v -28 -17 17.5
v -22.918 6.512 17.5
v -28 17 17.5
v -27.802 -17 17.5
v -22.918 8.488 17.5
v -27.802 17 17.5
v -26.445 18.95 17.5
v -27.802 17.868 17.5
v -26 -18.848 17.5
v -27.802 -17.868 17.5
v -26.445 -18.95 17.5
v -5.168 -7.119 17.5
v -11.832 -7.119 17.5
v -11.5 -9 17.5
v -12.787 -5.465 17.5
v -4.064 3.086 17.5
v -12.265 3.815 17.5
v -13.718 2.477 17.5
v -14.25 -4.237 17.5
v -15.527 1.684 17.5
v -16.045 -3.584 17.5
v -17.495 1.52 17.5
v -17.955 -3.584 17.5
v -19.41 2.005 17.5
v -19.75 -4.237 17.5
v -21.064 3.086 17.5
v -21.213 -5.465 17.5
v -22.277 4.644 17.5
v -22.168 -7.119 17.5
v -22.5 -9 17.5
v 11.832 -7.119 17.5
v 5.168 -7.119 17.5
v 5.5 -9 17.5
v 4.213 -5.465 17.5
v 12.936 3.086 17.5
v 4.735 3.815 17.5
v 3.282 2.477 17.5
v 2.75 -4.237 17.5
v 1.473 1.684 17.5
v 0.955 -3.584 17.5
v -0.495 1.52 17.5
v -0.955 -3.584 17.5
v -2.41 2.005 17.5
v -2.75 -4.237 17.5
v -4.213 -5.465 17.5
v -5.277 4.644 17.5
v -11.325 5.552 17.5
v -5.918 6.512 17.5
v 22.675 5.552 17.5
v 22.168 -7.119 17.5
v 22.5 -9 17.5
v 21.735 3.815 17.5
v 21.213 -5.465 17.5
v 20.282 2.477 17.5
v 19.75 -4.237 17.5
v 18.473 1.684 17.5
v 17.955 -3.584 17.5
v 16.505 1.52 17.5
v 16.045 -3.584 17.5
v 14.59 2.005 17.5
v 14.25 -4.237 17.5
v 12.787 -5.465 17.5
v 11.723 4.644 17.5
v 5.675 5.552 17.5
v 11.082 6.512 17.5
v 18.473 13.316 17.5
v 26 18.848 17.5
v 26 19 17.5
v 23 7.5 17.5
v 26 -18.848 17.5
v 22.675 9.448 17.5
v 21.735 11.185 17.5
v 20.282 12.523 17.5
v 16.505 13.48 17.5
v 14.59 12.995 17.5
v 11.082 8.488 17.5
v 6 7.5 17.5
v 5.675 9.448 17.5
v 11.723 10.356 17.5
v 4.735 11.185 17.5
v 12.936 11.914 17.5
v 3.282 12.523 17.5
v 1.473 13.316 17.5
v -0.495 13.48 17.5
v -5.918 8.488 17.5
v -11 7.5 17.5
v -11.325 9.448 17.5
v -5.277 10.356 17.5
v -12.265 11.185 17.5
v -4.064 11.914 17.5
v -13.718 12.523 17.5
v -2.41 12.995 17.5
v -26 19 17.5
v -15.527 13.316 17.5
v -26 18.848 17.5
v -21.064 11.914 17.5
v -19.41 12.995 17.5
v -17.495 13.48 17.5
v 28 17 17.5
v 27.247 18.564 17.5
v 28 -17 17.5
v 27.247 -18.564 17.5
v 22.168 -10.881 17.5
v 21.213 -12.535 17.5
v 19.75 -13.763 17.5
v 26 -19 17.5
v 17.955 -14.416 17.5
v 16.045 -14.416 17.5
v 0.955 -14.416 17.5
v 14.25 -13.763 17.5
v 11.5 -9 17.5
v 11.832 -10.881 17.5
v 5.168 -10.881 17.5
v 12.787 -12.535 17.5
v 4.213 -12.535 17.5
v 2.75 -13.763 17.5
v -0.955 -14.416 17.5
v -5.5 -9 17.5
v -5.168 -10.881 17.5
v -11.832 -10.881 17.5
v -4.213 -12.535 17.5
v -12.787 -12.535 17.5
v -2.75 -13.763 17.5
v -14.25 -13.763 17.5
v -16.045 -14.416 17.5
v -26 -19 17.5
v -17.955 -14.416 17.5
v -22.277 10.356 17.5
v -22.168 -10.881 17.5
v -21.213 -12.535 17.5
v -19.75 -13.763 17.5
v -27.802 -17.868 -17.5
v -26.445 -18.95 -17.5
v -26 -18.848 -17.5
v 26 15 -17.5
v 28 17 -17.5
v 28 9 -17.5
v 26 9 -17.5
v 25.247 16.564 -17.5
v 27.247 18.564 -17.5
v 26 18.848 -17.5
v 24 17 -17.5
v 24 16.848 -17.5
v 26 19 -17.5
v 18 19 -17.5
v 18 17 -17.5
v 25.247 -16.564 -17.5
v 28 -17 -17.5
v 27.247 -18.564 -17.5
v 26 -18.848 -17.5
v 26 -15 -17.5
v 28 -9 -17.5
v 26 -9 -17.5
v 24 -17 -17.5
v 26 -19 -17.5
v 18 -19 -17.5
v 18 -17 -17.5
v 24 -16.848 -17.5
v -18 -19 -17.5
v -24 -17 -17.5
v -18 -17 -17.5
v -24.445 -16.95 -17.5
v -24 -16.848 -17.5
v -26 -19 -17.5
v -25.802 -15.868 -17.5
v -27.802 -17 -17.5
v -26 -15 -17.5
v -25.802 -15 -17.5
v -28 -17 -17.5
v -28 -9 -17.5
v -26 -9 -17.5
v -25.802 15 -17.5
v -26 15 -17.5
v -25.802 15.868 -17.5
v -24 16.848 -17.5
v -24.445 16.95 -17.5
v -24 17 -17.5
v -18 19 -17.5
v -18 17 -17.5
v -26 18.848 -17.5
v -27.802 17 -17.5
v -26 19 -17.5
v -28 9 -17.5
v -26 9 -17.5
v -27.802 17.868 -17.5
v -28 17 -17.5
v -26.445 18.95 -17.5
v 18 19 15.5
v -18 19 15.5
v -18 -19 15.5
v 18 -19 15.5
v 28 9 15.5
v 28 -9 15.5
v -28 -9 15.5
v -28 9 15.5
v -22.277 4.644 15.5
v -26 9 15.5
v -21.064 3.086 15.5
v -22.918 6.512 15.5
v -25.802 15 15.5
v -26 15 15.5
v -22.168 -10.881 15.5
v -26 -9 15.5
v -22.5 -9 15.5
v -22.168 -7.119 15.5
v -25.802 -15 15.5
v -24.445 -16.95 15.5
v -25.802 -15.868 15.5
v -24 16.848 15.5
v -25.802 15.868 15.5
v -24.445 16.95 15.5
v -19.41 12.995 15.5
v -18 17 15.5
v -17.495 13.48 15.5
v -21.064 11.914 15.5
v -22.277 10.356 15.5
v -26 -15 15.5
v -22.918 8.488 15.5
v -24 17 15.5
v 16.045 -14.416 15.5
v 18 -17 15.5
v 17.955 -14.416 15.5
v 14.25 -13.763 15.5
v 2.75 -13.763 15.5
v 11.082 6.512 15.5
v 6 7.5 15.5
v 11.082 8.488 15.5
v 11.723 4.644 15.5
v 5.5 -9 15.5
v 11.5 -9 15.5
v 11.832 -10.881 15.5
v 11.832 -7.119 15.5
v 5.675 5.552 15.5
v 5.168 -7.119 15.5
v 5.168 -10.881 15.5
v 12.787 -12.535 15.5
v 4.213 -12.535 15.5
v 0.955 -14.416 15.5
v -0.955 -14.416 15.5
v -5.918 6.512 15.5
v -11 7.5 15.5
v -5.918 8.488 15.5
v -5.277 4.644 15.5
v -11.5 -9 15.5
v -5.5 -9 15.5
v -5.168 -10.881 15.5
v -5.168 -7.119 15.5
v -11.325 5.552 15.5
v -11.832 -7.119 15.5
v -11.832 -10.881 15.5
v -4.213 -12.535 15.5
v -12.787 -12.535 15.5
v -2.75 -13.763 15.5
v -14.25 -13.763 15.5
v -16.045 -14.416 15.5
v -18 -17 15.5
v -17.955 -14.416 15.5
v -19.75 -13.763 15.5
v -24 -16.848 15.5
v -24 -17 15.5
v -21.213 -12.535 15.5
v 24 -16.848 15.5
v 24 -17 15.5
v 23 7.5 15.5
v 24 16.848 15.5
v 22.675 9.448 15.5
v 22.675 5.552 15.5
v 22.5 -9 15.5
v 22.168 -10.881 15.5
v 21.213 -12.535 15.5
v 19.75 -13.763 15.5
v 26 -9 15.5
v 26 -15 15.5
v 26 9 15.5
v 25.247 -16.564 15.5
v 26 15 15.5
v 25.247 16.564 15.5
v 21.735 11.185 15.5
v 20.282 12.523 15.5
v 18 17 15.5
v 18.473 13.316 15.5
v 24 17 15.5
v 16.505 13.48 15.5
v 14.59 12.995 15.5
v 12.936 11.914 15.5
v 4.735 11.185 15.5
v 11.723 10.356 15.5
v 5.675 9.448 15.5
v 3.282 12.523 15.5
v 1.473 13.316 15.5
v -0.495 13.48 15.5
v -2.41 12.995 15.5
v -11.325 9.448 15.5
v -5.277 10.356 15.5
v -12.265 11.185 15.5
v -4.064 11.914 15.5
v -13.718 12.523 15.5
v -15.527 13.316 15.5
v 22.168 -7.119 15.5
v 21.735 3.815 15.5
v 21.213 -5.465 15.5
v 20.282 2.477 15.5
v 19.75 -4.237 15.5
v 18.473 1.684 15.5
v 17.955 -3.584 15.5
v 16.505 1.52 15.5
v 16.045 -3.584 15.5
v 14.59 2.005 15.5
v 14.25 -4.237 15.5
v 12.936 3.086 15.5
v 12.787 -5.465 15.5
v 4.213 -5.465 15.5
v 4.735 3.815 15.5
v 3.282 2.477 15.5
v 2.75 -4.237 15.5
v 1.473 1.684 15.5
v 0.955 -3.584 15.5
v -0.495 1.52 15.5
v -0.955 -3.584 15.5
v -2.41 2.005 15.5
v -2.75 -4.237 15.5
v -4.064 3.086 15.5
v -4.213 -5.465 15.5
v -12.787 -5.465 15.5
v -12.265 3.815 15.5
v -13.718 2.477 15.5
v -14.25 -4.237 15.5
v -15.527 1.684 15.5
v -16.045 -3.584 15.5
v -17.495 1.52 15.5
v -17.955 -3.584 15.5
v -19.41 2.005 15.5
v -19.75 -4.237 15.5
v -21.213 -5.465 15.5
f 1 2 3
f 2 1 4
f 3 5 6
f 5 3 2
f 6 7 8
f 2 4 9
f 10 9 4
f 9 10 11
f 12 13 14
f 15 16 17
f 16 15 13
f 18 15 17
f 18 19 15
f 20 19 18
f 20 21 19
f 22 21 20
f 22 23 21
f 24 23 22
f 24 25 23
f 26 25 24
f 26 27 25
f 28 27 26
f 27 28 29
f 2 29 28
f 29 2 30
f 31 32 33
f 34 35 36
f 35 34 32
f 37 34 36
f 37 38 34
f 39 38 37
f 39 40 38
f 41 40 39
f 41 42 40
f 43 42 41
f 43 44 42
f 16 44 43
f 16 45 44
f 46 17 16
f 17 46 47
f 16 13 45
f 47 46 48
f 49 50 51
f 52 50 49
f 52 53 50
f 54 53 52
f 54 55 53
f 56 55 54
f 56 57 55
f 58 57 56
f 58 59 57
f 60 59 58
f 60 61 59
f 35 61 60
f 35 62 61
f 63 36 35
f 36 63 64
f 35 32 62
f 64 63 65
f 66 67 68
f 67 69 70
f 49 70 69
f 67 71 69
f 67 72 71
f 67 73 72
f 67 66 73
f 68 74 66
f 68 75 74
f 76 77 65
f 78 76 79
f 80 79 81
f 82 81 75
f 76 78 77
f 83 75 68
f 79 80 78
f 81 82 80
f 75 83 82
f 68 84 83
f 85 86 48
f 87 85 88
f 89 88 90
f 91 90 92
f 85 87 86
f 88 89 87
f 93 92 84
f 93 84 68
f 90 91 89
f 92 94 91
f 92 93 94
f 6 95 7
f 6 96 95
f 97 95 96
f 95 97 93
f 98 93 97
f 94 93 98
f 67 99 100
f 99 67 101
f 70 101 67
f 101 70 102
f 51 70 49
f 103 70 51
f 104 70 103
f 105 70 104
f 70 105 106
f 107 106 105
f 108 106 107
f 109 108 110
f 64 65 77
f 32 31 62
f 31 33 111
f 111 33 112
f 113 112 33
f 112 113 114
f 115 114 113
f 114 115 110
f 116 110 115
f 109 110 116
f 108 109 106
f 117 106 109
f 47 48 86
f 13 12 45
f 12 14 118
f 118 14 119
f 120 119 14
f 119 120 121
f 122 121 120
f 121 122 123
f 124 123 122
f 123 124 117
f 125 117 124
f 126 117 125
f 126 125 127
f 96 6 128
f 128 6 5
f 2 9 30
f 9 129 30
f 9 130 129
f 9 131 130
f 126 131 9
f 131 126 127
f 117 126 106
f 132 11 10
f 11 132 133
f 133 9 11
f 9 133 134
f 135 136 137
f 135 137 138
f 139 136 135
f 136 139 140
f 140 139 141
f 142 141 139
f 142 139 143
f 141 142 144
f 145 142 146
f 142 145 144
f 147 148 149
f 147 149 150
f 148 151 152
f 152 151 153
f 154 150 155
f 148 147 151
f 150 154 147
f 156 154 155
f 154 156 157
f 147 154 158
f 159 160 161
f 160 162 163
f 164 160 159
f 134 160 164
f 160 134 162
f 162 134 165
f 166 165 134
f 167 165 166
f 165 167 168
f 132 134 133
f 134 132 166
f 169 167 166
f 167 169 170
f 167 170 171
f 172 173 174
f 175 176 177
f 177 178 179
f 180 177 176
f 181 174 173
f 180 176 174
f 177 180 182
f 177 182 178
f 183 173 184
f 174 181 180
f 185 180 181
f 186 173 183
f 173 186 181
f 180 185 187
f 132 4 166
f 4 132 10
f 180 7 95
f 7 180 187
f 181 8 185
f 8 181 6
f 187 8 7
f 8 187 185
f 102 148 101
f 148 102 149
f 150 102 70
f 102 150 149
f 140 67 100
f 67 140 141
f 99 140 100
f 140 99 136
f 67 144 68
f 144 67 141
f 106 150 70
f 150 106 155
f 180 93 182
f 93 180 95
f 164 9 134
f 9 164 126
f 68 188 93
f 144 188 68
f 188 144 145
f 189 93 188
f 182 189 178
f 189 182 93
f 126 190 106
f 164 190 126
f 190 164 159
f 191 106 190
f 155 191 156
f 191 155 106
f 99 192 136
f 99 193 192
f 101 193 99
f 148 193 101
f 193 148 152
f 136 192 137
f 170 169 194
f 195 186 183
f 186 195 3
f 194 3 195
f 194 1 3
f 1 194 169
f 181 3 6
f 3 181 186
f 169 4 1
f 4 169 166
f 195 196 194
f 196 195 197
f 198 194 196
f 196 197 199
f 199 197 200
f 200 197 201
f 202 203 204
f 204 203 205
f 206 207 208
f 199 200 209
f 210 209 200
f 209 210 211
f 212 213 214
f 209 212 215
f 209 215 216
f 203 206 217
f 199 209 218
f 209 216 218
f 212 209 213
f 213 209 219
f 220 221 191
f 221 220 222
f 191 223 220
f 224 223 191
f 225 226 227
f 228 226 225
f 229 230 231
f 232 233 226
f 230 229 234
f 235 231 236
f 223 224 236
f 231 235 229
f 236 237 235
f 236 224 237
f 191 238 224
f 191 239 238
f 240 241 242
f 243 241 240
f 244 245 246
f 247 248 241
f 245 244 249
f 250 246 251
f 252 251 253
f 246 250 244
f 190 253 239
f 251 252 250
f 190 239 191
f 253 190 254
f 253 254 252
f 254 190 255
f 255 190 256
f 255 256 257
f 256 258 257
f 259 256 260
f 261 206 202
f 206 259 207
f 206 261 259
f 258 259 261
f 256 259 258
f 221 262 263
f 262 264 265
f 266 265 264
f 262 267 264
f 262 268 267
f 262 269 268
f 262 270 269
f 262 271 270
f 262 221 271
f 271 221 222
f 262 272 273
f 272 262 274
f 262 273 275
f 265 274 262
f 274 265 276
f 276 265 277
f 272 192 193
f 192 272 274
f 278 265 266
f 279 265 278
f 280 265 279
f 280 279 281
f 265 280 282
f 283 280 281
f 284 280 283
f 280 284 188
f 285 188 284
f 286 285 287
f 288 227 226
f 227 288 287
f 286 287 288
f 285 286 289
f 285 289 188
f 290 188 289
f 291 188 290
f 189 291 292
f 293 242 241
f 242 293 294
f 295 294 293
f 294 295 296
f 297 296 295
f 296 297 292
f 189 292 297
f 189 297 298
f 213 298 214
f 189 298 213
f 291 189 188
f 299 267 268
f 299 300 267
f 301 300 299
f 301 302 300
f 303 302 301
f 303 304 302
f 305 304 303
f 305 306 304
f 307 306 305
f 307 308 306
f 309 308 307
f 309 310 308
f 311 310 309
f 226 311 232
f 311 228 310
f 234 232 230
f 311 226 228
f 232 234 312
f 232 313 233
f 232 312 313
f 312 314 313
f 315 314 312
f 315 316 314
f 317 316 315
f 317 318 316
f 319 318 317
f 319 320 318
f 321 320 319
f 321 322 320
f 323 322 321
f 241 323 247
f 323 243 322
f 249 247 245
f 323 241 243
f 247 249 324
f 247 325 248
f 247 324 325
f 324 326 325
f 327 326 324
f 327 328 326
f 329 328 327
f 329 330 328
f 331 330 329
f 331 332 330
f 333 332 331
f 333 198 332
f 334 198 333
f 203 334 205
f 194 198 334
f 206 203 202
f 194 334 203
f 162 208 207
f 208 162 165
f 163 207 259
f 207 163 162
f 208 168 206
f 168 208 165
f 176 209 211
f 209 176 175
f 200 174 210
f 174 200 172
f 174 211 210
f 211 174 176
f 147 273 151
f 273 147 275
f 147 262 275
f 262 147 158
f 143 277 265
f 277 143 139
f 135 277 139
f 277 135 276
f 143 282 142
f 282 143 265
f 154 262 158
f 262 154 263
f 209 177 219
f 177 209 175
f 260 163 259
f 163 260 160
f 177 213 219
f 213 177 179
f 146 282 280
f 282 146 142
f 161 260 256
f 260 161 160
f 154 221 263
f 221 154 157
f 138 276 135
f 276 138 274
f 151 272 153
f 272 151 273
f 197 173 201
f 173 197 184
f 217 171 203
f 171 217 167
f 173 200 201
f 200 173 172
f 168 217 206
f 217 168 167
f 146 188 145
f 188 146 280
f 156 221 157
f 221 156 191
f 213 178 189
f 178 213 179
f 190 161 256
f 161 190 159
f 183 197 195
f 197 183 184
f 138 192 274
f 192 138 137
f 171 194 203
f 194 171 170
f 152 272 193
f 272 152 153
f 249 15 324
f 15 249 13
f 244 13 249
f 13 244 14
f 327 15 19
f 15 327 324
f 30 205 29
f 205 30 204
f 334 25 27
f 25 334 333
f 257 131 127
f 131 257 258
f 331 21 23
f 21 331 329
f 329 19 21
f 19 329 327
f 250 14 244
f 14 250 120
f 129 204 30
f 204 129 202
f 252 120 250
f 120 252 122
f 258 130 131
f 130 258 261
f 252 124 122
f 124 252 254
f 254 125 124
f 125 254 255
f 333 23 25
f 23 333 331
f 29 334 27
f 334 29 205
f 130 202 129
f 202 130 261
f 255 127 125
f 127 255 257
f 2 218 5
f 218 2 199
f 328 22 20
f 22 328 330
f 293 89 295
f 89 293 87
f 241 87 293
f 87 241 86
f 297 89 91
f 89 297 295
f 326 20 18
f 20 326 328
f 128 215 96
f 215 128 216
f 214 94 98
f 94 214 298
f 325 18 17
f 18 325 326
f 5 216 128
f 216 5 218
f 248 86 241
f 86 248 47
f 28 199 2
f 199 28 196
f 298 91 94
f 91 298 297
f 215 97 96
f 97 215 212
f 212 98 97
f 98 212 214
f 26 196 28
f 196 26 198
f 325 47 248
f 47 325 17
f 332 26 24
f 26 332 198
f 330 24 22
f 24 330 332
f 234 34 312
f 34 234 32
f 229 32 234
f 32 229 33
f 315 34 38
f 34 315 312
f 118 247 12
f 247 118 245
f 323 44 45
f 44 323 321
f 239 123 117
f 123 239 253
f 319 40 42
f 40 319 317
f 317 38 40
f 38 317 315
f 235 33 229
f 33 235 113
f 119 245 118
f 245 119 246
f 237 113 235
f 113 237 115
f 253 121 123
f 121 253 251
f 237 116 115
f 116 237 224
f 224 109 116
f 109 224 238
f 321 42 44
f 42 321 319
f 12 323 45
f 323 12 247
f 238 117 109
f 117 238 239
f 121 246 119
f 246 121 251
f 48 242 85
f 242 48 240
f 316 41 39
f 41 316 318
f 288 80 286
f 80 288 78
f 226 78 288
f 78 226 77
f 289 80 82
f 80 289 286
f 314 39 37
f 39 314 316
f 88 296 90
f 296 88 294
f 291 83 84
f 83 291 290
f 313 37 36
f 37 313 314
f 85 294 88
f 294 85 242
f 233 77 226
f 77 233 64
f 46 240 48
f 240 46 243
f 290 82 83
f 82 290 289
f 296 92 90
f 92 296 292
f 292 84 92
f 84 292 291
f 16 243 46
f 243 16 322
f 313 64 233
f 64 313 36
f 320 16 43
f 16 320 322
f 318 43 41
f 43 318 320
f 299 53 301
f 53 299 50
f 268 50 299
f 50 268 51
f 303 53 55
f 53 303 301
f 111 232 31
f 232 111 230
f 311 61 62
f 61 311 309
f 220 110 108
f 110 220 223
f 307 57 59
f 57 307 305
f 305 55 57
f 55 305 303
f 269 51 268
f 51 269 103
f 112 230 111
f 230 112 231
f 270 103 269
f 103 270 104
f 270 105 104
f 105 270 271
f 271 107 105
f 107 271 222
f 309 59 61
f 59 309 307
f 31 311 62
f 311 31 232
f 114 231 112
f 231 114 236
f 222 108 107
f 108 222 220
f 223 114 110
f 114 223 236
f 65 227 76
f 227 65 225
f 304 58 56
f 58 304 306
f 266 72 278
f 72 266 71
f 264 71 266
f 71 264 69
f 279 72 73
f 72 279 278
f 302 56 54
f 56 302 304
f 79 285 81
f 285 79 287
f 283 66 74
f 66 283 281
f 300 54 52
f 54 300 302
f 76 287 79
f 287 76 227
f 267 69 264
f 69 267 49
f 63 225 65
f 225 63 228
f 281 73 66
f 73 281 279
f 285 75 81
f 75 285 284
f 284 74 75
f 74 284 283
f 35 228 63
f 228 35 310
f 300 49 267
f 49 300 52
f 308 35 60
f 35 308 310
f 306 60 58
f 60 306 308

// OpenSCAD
use <MCAD/boxes.scad>

// 3 centrifuge tubes
// 3 tubes with blue top

d_cf = 11;
d_big = 12;

h = 35;
wall = 2;
pad = 5;

x_size = pad+(d_big+pad)*3;
y_size = d_big+d_cf+pad*3;

difference() {
  roundedBox([x_size, y_size, h], 2, true);
  translate([0, 0, -wall]) {
    roundedBox([x_size-wall*2, y_size-wall*2, h], 2, true);
  }
  translate([0, 0, -wall]) {
    roundedBox([x_size-20, y_size+20, h], 2, true);
  }
  translate([0, 0, -wall]) {
    roundedBox([x_size+20, y_size-20, h], 2, true);
  }
  translate([0, -(d_big+d_cf-pad)/2, 0]) {
    for(x=[-1:1]) {
      translate([(d_big+pad)*x, 0, 0]) {
        cylinder(d=d_cf, h=h*2, center=true);
        translate([0, pad+(d_cf+d_big)/2, 0]) {
          cylinder(d=d_big, h=h*2, center=true);
        }
      }
    }
  }
}
